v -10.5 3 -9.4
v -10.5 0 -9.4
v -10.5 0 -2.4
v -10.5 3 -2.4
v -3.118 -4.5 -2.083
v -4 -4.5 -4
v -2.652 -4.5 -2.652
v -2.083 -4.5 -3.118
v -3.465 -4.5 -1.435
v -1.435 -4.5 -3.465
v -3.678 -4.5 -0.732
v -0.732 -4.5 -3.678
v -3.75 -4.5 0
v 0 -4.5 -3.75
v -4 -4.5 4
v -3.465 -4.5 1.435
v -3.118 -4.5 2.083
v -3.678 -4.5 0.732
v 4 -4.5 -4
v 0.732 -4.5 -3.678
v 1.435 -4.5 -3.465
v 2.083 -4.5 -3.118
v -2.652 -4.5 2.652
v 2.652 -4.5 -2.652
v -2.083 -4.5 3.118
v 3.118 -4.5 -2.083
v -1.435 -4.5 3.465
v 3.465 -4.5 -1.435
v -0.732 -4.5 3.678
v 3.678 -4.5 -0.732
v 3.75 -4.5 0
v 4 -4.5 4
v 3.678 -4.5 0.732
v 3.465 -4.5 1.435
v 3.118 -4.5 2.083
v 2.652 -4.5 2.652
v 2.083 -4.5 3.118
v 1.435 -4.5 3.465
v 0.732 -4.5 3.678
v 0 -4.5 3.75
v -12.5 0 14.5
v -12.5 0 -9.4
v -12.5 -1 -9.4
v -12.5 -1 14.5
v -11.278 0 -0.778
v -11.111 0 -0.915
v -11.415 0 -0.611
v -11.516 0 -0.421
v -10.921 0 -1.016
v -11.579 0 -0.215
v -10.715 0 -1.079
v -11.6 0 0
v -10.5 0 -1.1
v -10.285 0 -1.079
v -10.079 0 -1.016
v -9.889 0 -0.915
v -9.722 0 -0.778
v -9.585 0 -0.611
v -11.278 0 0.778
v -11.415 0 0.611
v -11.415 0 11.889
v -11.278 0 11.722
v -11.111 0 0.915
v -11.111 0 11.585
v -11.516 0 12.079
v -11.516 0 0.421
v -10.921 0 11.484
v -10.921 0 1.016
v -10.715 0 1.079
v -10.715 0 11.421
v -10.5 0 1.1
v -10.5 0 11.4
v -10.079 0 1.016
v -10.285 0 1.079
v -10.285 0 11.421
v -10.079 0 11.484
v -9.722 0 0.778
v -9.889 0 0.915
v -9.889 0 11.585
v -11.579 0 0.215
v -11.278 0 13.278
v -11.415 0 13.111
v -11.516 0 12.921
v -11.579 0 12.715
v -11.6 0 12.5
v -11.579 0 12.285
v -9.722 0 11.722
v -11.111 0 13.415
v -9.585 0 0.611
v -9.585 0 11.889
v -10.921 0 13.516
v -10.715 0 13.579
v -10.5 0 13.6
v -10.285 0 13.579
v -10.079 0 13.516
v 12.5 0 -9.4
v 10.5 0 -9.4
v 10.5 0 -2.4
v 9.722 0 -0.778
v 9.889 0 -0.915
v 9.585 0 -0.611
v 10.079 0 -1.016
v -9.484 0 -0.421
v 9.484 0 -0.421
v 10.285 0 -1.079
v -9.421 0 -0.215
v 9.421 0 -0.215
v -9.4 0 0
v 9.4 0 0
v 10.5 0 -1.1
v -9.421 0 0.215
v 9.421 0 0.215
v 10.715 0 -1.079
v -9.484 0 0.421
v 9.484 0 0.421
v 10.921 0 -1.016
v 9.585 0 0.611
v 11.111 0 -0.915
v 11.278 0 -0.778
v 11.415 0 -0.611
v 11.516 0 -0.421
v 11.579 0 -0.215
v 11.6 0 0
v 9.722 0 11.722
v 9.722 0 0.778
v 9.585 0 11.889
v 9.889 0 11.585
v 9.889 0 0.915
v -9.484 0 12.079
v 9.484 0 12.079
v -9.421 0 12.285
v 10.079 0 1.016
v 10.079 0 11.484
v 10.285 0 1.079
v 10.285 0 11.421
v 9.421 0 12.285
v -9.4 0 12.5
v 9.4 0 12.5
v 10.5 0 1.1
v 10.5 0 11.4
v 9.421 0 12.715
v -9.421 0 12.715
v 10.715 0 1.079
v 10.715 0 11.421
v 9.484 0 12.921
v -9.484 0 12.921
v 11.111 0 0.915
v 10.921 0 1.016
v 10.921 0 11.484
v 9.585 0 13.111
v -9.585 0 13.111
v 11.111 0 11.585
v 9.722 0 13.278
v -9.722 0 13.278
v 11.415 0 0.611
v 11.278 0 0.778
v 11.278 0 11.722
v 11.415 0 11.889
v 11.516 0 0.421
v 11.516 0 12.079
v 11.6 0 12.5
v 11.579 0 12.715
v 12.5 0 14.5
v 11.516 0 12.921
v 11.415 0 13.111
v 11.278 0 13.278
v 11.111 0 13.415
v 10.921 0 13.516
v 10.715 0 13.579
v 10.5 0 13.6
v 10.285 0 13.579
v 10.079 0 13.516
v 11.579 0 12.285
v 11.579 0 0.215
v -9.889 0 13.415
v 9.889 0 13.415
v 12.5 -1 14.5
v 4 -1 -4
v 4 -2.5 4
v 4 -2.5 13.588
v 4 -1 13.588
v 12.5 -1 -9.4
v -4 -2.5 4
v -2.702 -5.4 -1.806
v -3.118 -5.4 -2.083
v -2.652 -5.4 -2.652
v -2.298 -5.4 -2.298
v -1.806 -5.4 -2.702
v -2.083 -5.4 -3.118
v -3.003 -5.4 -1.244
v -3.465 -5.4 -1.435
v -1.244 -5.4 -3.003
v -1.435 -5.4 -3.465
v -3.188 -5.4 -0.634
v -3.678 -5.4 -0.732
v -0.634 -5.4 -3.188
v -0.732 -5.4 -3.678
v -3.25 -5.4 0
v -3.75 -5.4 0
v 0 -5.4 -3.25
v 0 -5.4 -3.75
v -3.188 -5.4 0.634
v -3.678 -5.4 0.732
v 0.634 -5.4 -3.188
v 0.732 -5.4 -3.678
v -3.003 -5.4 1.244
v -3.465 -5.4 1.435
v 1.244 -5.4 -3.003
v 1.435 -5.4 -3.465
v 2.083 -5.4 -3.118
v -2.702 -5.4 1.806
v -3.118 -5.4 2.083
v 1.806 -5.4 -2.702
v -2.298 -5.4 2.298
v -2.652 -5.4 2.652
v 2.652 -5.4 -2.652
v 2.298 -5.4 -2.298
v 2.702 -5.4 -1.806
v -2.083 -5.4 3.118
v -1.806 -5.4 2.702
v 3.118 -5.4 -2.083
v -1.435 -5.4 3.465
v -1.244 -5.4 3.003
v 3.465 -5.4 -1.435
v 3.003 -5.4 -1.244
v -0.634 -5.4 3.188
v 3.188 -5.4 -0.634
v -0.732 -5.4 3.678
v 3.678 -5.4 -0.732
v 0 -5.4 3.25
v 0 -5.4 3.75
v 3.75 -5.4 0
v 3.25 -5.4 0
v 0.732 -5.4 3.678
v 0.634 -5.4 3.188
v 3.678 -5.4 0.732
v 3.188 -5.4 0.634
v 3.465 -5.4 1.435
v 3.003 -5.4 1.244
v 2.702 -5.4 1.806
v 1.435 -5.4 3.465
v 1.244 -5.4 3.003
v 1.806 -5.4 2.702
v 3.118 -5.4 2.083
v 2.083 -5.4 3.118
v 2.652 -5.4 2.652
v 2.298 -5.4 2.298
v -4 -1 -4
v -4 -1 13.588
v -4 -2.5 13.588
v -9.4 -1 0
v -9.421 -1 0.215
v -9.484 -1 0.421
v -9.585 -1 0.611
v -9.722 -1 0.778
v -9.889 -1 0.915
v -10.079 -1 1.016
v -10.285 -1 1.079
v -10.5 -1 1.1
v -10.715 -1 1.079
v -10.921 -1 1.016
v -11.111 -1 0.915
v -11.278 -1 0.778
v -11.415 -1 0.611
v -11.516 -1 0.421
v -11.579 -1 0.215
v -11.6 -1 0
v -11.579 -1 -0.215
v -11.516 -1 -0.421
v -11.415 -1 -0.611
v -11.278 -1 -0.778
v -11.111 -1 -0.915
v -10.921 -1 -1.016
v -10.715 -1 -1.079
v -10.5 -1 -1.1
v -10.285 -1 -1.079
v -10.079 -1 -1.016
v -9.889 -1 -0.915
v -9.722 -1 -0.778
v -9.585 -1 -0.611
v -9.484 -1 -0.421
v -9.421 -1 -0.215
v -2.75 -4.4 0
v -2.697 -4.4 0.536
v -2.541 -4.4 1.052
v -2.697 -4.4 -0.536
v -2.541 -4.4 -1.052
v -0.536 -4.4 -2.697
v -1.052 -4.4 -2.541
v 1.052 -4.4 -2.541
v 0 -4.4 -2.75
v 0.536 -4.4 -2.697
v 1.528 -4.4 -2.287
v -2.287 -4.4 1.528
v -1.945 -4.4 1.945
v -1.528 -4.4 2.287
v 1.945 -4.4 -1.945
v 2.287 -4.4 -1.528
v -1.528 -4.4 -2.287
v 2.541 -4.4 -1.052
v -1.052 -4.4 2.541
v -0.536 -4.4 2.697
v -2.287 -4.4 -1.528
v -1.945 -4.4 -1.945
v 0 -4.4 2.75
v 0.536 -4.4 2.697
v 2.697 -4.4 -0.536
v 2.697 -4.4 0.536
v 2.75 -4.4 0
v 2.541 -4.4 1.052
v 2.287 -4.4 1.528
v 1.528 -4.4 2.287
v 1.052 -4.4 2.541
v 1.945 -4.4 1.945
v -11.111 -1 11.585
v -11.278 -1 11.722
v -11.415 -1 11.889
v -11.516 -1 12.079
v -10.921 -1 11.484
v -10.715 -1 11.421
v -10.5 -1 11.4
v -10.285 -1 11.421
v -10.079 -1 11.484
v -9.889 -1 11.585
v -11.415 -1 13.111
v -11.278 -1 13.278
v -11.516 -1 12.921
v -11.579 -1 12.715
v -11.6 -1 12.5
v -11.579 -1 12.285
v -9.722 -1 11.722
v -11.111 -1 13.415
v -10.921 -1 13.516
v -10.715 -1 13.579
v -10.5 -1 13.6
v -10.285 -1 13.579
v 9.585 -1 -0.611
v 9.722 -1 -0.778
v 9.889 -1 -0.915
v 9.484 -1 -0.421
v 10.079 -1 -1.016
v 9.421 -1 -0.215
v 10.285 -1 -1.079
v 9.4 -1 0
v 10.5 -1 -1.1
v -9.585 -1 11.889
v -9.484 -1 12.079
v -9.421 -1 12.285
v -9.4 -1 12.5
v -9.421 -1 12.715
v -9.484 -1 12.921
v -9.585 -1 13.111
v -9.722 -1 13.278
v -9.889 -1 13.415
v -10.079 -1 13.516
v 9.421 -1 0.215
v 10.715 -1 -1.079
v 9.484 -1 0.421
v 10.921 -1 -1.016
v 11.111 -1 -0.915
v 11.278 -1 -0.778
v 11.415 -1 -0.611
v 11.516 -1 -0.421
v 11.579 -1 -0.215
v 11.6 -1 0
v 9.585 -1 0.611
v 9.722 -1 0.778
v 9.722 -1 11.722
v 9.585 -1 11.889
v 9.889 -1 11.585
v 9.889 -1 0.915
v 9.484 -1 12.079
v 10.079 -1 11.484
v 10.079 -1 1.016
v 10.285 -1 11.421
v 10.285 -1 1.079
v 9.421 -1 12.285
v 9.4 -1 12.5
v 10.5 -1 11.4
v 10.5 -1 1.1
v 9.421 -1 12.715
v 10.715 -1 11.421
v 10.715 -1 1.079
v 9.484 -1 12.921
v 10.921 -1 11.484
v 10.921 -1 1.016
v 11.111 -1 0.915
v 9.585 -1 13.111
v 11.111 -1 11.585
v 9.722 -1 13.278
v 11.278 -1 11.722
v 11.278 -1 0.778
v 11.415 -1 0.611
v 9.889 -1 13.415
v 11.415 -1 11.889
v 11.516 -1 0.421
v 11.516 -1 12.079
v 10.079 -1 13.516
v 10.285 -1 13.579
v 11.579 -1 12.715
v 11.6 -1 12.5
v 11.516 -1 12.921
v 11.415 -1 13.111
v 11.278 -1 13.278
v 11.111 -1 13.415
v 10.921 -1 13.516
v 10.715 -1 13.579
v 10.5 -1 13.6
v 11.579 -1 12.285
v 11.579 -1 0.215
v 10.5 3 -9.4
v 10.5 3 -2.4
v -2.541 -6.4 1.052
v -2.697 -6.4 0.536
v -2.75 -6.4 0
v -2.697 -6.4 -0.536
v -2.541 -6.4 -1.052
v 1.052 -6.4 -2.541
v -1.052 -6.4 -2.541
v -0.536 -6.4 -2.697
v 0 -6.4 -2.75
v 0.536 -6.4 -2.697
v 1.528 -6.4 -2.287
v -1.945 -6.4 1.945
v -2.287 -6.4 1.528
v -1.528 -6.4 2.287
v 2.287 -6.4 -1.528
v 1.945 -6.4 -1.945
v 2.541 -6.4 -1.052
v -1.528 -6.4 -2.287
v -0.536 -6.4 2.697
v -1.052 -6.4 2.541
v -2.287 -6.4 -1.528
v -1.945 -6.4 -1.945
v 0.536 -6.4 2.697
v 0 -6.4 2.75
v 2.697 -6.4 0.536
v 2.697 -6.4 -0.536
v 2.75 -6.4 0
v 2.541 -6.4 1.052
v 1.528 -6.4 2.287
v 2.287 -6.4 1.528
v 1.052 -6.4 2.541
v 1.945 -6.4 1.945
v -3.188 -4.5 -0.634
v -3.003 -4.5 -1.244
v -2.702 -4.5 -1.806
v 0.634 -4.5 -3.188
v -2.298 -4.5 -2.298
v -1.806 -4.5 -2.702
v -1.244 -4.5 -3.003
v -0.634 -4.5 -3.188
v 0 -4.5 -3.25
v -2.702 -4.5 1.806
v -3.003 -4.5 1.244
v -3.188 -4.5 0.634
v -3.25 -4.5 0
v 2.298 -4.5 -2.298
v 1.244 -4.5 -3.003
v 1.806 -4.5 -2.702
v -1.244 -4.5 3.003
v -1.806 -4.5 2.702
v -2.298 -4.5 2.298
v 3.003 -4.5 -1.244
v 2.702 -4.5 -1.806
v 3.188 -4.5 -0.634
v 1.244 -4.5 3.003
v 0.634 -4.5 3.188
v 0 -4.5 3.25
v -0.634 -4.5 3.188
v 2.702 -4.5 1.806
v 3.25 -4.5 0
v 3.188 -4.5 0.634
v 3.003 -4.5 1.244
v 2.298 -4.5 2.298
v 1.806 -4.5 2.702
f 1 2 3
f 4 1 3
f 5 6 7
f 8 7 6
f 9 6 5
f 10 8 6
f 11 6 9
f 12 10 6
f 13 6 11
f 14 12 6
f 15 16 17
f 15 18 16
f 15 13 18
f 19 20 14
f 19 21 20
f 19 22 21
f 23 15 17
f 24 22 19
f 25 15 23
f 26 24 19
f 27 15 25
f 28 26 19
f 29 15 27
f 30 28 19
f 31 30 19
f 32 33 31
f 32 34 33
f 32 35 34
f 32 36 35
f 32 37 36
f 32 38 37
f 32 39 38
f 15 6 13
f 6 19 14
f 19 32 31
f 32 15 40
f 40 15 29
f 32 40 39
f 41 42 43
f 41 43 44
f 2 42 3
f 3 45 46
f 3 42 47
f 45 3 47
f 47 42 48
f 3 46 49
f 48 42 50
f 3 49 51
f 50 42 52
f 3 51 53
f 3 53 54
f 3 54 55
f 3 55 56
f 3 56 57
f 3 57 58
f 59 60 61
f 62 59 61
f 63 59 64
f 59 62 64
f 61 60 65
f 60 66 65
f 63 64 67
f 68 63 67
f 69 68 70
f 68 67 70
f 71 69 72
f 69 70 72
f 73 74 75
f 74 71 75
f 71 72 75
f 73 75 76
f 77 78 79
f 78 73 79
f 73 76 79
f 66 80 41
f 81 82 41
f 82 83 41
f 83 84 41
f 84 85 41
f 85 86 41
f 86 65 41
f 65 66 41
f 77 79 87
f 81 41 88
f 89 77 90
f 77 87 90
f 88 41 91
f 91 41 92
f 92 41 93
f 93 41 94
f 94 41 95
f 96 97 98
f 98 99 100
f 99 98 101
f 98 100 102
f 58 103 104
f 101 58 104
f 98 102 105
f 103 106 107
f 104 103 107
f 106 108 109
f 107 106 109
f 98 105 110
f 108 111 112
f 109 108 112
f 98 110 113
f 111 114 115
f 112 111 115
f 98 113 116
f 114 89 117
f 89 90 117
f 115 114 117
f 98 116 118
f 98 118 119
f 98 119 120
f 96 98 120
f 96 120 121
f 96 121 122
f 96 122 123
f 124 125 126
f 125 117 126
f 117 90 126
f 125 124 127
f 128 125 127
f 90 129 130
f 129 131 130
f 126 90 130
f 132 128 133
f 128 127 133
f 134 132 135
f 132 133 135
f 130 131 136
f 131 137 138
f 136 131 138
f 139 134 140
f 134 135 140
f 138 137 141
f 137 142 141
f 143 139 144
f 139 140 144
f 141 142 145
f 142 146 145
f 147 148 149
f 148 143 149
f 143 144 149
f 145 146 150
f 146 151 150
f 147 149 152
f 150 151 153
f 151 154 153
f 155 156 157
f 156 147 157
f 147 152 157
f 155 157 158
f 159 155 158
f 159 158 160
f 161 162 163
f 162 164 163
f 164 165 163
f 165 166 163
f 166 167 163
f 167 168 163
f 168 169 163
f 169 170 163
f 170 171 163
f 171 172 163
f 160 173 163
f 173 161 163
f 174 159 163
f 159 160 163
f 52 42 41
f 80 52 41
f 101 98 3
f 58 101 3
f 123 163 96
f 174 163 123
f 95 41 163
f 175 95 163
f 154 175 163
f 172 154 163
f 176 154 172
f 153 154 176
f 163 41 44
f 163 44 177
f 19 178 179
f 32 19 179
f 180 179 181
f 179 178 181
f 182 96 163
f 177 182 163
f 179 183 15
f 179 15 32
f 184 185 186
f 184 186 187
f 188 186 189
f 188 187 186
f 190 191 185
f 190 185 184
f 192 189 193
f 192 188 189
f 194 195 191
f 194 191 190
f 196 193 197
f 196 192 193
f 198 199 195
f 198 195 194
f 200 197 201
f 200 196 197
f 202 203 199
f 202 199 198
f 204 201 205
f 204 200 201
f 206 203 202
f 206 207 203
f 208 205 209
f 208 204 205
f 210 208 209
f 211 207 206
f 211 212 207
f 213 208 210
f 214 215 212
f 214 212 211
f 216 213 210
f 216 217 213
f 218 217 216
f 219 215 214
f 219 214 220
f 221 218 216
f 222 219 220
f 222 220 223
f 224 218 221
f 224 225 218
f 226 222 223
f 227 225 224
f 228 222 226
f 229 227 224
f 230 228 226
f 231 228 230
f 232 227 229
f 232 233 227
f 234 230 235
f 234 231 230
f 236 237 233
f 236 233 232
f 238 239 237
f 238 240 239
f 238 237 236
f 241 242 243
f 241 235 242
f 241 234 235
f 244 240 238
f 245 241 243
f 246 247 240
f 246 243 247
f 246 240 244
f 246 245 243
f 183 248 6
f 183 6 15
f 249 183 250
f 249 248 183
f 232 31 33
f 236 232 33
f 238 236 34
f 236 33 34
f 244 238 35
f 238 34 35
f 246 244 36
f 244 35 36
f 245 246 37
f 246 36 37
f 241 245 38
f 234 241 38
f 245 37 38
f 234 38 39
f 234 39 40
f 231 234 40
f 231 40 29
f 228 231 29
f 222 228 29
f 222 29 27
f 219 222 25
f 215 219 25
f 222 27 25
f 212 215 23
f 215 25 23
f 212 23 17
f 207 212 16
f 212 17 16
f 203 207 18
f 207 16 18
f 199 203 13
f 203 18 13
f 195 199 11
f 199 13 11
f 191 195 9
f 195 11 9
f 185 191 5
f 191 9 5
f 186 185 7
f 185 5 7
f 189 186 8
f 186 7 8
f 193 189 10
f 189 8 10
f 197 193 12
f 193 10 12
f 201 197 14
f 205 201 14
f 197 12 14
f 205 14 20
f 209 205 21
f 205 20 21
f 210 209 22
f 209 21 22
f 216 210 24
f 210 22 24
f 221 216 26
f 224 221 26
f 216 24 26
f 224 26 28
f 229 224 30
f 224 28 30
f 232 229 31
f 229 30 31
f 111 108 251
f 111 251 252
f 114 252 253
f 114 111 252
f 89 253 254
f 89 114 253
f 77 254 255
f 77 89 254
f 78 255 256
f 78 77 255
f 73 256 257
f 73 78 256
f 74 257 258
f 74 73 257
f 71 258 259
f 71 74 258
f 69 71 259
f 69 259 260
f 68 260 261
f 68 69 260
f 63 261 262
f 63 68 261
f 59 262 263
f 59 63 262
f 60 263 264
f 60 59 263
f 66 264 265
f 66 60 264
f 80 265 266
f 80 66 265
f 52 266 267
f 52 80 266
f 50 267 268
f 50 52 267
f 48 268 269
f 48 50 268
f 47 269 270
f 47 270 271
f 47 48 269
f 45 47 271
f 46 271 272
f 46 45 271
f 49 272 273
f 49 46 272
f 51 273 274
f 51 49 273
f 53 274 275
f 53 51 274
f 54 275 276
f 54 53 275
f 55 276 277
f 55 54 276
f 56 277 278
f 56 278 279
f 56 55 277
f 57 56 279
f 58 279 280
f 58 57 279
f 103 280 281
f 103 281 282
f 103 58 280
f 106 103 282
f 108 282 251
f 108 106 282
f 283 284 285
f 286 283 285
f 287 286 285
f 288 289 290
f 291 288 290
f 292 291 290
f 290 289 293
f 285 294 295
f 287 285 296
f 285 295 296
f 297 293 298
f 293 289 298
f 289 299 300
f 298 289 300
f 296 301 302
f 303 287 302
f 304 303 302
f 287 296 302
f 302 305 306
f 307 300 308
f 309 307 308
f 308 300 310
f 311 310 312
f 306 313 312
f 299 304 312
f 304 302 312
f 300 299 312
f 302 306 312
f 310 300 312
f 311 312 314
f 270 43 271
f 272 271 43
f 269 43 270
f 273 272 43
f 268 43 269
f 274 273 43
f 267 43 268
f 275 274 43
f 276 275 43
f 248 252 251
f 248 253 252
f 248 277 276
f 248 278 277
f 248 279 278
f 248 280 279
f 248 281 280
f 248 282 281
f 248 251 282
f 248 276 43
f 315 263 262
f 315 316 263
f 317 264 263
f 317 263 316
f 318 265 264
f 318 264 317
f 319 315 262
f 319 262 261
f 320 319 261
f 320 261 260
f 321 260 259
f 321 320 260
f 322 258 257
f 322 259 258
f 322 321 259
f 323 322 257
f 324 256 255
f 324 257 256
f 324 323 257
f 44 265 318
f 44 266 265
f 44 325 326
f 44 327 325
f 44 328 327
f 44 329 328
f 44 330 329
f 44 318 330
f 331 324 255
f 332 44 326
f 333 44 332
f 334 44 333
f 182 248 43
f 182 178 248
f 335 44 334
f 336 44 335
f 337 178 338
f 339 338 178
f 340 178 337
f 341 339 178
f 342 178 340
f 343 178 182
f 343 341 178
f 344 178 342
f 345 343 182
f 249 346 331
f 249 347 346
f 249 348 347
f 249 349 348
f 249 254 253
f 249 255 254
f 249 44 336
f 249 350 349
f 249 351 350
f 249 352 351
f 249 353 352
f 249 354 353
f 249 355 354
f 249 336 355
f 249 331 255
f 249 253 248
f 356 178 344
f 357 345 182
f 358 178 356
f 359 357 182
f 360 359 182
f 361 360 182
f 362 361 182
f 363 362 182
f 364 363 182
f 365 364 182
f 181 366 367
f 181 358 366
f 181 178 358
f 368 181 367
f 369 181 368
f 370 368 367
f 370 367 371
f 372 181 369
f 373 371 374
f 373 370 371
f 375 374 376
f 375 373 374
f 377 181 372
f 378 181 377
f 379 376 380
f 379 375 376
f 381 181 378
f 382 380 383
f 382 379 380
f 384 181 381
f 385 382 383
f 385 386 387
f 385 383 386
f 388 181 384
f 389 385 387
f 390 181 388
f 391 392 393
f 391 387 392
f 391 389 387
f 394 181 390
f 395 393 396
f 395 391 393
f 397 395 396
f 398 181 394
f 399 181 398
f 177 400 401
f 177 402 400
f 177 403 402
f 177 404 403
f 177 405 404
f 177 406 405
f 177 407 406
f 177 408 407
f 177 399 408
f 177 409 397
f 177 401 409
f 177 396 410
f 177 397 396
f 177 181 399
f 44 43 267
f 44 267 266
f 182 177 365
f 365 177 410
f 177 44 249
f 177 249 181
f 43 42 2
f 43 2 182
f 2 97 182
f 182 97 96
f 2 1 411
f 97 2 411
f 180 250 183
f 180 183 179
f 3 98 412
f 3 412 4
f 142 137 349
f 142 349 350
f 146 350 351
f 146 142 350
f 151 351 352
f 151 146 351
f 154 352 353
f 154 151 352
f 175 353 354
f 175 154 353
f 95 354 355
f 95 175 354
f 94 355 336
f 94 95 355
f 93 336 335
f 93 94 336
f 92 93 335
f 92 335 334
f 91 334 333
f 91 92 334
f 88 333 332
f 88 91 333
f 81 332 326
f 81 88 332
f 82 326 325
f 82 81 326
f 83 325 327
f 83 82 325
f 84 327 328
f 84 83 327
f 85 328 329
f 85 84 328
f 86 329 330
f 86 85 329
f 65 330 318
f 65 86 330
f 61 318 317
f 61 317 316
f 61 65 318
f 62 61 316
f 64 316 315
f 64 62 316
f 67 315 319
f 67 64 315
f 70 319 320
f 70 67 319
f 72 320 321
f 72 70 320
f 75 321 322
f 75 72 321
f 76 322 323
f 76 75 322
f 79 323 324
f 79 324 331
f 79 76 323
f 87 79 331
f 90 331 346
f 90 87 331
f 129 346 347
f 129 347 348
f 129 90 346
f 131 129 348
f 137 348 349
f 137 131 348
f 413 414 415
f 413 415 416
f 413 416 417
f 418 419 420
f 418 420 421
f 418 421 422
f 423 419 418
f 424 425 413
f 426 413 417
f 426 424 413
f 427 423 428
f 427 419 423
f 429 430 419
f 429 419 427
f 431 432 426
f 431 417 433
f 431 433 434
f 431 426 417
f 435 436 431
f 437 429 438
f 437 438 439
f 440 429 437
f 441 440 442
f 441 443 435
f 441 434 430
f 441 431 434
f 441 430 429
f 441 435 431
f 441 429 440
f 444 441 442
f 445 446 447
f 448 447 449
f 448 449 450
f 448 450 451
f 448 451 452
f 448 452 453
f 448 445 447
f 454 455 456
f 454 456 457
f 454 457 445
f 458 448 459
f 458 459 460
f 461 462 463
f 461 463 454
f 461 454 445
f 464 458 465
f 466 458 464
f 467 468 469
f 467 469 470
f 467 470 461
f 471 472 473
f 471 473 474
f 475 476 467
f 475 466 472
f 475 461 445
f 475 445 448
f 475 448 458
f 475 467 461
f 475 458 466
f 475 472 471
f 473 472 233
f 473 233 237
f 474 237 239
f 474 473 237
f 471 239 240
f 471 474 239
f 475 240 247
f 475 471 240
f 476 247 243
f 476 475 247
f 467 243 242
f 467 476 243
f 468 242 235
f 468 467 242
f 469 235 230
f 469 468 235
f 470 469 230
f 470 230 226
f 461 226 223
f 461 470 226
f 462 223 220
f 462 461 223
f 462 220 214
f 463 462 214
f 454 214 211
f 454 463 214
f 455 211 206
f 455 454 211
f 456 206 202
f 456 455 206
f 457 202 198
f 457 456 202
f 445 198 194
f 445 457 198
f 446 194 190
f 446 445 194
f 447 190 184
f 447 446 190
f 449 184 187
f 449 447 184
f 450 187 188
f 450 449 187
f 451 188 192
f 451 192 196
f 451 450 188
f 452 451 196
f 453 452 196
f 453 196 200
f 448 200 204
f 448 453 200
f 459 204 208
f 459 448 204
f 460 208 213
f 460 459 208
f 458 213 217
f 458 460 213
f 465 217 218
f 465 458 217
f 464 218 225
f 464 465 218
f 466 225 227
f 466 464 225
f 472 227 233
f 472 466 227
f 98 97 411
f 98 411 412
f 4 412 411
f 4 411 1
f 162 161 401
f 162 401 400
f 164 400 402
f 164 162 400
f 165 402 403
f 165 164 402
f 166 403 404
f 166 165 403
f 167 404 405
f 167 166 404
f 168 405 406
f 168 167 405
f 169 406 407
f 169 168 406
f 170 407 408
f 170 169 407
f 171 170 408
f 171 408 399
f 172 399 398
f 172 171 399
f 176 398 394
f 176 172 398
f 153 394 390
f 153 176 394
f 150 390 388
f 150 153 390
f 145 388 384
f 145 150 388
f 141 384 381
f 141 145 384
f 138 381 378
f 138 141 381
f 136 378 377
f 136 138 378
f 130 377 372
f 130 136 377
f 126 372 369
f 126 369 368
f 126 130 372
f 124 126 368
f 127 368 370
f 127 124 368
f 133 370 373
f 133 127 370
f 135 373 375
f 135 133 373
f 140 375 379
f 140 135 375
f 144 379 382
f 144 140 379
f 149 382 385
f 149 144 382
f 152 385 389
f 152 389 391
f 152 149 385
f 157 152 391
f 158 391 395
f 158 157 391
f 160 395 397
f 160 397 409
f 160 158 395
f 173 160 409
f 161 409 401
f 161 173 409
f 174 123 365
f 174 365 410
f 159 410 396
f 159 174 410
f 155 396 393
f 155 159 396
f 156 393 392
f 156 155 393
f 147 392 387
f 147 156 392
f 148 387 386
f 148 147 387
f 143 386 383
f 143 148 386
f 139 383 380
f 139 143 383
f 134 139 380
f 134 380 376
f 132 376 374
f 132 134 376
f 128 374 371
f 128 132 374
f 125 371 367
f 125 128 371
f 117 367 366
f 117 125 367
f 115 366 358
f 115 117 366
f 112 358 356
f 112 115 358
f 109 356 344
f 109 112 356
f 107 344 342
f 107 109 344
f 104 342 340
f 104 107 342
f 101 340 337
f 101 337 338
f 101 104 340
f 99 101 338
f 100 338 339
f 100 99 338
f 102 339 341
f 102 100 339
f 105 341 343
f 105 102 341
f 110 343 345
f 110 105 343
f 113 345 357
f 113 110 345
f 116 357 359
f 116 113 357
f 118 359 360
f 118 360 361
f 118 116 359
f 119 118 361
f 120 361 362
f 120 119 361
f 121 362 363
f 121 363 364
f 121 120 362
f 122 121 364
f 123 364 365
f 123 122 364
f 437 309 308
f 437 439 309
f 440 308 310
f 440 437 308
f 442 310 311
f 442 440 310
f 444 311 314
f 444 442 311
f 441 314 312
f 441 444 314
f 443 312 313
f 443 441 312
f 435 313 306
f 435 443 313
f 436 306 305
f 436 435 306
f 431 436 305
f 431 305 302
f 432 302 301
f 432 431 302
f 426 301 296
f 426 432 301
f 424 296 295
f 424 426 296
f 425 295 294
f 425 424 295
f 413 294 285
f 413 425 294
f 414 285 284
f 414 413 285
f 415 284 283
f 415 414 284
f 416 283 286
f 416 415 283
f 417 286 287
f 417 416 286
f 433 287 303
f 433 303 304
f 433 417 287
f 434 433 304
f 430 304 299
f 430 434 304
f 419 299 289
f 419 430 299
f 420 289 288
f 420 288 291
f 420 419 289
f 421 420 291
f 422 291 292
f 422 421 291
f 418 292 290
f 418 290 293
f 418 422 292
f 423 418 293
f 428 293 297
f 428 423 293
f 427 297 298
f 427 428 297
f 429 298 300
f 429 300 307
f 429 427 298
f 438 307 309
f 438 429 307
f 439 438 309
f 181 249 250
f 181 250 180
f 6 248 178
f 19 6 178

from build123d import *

# Parameters (mm, degrees)
F0_W          = 25
F0_H          = 23.9
F0_R          = 1.1
F1_DEPTH      = 1
F2_W          = 8
F2_H          = 8
F3_DEPTH      = 3.5
F4_R          = 3.75
F4_R_2        = 3.25
F5_DEPTH      = 0.9
F6_R          = 2.75
F7_DEPTH      = 1
F7_DEPTH_BACK = 1
F8_W          = 8
F8_H          = 9.601063
F9_DEPTH      = 1.5
F10_W         = 21
F10_H         = 7
F11_DEPTH     = 3


with BuildPart() as f1:
    # F0 (on Front) → F1 (new body)
    with BuildSketch(Plane.XZ):
        with Locations((0, 2.55)):
            Rectangle(F0_W, F0_H)
        with Locations((-10.5, 0)):
            Circle(F0_R, mode=Mode.SUBTRACT)
        with Locations((10.5, 0)):
            Circle(F0_R, mode=Mode.SUBTRACT)
        with Locations((-10.5, 12.5)):
            Circle(F0_R, mode=Mode.SUBTRACT)
        with Locations((10.5, 12.5)):
            Circle(F0_R, mode=Mode.SUBTRACT)
    extrude(amount=F1_DEPTH)

    # F2 (on face) → F3 (join)
    with BuildSketch(Plane.XZ.offset(1)):
        Rectangle(F2_W, F2_H)
    extrude(amount=F3_DEPTH)

    # F4 (on face) → F5 (join)
    with BuildSketch(Plane.XZ.offset(4.5)):
        Circle(F4_R)
        Circle(F4_R_2, mode=Mode.SUBTRACT)
    extrude(amount=F5_DEPTH)

    # F8 (on face) → F9 (join)
    with BuildSketch(Plane.XZ.offset(1)):
        with Locations((0, 8.787777)):
            Rectangle(F8_W, F8_H)
    extrude(amount=F9_DEPTH)

    # F10 (on face) → F11 (join)
    with BuildSketch(Plane(origin=(0, 0, 0), x_dir=(-1, 0, 0), z_dir=(0, 1, 0))):
        with Locations((0, -5.9)):
            Rectangle(F10_W, F10_H)
    extrude(amount=F11_DEPTH)


with BuildPart() as f7:
    # F6 (on face) → F7 (new body, two sides)
    with BuildSketch(Plane.XZ.offset(5.4)) as f7_sk:
        Circle(F6_R)
    extrude(amount=F7_DEPTH)
    extrude(f7_sk.sketch, amount=-F7_DEPTH_BACK)


solid = Compound([f1.part, f7.part])
